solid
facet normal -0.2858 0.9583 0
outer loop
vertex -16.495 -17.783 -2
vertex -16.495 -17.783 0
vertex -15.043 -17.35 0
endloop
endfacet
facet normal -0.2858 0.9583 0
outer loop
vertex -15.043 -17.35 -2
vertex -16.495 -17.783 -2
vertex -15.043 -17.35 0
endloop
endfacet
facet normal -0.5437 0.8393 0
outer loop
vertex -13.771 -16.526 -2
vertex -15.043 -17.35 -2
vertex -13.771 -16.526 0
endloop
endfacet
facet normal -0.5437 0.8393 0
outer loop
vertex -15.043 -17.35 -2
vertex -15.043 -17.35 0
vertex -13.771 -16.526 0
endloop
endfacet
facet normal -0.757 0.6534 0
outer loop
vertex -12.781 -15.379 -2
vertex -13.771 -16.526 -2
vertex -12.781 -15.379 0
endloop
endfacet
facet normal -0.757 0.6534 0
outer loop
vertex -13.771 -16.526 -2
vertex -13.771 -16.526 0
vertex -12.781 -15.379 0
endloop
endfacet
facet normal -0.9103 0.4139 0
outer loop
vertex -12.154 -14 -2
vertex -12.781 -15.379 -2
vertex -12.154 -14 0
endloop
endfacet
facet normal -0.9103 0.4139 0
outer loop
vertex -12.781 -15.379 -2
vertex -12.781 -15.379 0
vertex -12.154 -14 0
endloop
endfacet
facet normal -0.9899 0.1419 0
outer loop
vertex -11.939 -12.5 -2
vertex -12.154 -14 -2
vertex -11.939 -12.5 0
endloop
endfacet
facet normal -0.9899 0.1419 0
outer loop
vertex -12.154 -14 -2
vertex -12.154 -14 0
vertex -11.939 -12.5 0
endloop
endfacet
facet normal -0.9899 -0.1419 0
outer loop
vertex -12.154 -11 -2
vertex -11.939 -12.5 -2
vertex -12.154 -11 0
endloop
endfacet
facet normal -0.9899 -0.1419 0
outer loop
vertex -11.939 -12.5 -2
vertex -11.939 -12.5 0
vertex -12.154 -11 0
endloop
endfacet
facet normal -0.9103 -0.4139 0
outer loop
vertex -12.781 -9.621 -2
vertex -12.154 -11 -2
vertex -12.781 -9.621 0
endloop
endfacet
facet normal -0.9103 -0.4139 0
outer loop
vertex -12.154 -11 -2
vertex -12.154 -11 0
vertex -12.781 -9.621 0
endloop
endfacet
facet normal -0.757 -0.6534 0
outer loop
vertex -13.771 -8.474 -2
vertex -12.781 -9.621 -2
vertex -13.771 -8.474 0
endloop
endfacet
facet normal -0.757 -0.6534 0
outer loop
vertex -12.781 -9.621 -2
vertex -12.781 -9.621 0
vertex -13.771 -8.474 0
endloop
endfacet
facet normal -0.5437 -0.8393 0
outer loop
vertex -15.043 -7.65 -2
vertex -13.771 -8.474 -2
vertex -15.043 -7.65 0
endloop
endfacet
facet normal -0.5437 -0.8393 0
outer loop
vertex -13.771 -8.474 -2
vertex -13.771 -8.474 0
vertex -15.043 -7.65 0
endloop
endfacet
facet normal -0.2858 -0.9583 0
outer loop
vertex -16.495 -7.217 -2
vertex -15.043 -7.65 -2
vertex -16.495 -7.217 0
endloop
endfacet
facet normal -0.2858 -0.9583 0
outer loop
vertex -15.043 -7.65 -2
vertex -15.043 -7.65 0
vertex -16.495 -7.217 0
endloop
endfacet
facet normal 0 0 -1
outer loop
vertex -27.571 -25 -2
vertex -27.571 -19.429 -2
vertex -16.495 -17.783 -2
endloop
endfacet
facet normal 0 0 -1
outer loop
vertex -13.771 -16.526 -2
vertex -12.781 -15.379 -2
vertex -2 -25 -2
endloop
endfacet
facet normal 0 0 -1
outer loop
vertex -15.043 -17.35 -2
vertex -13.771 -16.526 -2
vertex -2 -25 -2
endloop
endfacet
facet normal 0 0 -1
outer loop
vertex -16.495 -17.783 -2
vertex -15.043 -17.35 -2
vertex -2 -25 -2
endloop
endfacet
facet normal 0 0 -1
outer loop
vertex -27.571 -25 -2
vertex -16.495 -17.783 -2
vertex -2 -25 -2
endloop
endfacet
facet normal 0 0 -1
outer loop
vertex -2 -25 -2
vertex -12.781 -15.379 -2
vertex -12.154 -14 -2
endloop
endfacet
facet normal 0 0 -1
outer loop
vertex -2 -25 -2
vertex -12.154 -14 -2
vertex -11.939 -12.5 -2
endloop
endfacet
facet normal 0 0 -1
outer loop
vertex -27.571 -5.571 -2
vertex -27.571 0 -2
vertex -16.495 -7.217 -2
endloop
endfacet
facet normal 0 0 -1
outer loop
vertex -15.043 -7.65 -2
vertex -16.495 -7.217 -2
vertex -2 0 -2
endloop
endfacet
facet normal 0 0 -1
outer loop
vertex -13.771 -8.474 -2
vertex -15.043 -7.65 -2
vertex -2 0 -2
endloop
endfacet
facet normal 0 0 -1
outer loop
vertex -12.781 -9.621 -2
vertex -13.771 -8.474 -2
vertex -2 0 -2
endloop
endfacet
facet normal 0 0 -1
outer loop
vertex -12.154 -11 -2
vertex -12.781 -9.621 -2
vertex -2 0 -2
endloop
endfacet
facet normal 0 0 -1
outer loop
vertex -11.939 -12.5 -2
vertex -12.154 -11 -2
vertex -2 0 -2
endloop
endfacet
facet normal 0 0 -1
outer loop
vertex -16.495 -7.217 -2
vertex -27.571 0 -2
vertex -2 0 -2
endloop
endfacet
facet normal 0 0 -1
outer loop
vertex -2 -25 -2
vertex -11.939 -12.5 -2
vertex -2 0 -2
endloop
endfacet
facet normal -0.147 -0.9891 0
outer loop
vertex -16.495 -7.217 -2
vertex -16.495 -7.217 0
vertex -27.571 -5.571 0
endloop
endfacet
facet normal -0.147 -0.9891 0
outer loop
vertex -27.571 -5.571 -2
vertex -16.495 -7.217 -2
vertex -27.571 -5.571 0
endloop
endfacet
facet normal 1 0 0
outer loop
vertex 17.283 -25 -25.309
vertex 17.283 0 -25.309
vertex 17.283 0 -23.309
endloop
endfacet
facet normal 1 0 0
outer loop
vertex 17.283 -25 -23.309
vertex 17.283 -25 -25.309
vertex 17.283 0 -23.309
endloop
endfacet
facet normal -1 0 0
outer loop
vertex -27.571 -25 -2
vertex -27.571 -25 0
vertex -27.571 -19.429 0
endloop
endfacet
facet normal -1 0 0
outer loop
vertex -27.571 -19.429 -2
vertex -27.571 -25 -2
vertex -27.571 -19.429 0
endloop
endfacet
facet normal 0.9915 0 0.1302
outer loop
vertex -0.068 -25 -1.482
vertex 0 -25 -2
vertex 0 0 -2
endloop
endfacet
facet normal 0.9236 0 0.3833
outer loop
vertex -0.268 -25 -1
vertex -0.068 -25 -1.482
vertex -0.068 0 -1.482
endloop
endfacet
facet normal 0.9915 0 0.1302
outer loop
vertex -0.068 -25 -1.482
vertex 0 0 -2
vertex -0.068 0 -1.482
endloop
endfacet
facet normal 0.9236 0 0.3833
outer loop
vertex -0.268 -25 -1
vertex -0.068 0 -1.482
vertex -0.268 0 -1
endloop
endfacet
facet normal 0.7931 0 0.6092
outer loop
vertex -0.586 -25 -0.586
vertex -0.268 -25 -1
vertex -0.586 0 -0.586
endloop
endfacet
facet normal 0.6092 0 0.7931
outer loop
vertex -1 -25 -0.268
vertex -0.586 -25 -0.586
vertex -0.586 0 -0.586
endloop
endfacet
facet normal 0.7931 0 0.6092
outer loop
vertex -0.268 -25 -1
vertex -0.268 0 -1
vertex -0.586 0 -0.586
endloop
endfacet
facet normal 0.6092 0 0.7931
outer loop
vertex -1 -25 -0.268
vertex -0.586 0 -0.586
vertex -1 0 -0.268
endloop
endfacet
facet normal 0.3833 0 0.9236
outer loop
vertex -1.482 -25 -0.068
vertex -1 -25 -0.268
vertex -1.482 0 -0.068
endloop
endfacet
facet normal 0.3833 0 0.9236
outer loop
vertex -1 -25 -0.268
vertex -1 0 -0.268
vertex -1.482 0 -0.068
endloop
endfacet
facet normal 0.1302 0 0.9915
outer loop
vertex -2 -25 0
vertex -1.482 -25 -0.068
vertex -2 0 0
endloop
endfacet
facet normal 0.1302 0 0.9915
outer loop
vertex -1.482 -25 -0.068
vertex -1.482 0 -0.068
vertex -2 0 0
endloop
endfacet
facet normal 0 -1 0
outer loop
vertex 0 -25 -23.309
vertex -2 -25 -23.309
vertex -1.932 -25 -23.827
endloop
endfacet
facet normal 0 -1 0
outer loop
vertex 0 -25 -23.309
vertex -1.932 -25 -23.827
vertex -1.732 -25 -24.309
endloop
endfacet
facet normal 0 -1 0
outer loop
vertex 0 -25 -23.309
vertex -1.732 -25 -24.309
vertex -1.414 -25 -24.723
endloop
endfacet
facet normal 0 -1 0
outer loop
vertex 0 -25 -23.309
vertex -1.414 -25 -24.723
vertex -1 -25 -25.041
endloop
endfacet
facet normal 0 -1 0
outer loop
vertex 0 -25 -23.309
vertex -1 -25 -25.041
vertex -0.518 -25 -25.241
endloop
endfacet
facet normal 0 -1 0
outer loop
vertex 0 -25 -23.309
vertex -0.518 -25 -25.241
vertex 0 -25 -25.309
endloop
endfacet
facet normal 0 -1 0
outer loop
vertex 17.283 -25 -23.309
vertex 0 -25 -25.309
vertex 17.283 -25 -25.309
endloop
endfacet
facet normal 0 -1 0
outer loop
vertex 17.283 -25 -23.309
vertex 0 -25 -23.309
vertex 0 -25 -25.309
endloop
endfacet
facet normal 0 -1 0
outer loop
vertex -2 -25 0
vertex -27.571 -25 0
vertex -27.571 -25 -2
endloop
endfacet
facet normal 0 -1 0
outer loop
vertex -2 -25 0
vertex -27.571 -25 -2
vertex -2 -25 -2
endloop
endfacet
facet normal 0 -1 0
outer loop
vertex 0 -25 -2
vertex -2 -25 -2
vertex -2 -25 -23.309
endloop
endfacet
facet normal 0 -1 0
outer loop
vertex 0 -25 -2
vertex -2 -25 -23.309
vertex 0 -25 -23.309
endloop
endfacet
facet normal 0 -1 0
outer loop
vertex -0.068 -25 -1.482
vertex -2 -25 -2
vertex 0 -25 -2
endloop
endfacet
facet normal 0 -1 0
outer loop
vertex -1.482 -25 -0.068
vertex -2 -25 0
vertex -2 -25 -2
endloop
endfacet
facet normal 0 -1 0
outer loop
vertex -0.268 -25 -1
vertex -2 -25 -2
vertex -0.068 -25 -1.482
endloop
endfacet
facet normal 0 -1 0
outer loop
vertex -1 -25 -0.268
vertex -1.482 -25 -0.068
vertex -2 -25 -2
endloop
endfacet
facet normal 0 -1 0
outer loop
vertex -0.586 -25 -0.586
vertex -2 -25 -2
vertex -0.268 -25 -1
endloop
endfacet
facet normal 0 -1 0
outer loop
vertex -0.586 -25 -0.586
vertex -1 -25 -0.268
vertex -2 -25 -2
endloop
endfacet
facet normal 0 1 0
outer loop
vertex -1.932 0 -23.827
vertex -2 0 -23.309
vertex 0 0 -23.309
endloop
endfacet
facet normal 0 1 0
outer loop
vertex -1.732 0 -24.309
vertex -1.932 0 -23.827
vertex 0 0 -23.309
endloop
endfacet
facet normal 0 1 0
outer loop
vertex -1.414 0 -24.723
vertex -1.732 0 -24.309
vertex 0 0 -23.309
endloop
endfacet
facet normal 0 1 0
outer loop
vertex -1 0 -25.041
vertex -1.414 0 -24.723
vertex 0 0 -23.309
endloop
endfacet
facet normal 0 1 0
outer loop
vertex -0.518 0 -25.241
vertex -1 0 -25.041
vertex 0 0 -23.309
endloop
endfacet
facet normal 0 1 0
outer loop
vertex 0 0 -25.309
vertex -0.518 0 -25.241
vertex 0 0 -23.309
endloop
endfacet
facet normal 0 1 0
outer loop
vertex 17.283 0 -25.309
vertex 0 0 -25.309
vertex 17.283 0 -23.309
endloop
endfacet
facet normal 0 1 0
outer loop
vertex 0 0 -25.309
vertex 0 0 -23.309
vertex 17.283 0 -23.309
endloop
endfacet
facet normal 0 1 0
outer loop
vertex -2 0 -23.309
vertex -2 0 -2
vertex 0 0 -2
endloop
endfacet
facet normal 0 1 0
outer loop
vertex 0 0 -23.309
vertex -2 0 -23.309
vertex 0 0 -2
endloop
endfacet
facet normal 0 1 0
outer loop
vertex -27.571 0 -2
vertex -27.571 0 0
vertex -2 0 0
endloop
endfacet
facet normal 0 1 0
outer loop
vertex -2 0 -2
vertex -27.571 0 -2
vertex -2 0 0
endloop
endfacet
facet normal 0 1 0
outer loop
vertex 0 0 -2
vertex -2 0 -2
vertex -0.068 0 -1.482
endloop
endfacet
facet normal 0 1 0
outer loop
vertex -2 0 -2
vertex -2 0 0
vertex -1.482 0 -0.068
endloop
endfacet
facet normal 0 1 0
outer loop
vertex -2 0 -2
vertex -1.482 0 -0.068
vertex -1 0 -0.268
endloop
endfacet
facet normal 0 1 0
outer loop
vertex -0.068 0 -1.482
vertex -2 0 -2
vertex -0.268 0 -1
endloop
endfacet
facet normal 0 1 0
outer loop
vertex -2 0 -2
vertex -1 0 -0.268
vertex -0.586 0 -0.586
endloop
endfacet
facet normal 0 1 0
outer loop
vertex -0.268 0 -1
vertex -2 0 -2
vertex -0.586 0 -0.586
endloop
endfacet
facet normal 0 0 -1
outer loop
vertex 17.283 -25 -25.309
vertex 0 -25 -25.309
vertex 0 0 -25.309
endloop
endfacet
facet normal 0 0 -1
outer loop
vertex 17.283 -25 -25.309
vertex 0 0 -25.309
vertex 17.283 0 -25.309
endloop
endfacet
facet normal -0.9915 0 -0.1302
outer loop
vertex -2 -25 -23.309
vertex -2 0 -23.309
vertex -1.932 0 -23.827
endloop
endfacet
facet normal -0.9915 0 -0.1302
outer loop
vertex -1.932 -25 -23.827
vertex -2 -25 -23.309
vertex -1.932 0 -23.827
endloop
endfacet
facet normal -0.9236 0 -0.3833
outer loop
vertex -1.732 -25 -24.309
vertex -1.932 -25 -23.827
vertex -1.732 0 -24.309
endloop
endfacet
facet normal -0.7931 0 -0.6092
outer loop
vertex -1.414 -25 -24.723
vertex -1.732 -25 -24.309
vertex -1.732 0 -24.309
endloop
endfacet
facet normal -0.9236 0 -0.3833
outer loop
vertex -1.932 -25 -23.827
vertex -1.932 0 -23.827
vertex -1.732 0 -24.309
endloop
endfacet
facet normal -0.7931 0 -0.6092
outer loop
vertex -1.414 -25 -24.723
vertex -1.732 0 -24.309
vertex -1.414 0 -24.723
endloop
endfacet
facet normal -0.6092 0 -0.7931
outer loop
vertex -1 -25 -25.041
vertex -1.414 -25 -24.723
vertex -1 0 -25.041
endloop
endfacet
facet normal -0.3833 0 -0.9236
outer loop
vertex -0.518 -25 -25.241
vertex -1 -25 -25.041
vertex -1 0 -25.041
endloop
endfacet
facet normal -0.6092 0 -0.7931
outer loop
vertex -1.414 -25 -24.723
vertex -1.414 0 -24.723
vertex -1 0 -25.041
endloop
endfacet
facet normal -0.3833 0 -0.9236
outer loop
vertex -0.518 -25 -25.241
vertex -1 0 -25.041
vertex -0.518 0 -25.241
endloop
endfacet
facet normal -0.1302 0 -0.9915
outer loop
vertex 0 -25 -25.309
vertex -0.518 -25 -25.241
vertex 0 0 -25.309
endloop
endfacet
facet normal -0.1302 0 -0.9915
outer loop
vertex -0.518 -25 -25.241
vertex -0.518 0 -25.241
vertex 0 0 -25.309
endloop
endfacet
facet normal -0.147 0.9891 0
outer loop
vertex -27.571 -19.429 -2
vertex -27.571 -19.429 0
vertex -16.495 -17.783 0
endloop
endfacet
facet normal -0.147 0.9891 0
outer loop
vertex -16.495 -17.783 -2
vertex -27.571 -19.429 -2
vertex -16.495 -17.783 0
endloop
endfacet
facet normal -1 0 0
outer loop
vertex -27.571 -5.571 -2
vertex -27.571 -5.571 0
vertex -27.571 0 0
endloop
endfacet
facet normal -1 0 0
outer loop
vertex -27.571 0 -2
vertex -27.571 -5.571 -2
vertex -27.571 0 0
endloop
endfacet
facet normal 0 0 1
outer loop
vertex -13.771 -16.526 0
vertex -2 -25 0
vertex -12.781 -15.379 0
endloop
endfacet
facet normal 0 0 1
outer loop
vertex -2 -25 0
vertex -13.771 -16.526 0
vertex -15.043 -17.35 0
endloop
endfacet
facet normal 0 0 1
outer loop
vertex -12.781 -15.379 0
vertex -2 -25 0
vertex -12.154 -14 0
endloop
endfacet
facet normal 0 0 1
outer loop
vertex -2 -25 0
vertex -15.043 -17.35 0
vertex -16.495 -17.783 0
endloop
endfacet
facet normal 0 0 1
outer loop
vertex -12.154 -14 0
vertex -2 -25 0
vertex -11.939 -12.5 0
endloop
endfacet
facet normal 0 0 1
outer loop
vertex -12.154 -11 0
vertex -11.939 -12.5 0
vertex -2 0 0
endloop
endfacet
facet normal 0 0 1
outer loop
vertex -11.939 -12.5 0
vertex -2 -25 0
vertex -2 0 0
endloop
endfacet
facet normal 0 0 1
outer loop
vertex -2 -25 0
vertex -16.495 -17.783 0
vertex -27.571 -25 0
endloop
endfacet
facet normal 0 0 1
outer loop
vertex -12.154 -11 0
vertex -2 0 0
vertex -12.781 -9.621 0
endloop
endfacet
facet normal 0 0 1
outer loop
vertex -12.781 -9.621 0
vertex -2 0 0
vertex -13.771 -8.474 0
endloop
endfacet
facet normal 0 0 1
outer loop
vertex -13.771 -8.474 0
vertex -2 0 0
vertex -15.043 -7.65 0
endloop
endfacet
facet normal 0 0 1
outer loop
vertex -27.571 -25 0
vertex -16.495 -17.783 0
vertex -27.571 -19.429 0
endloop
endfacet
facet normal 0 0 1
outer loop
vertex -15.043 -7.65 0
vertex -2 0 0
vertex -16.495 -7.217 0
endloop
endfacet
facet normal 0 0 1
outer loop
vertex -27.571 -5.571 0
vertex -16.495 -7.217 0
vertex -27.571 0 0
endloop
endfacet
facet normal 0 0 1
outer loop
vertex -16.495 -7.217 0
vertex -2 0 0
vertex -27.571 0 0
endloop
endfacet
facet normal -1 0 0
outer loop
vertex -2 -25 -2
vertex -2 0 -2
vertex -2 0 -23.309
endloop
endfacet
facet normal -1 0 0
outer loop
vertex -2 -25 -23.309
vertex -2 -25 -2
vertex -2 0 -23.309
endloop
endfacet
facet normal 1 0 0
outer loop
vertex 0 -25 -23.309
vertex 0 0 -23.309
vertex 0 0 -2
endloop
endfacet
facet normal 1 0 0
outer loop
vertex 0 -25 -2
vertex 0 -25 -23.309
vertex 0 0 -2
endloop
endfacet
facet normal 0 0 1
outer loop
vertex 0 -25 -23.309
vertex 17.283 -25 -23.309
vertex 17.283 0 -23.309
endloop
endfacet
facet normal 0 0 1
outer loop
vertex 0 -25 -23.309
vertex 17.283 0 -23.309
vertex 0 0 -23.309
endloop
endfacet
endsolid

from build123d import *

# Parameters (mm, degrees)
F1_DEPTH = 25
F2_R     = 5.3407247833
F3_DEPTH = 25.3101193046
F5_DEPTH = 106
F6_DEPTH = 25.3101193046


# Not quite as in the source:
# - an extrude ends at something that could not be found from the text; its depth is read off the source's solid


with BuildPart() as f1:
    # F0 (on Front) → F1 (new body)
    with BuildSketch(Plane.XZ):
        with BuildLine():
            Line((-2, 0), (-58.1267029047, 0))
            Line((-58.1267029047, 0), (-58.1267029047, -2))
            Line((-58.1267029047, -2), (-2, -2))
            Line((-2, -2), (-2, -23.3091193046))
            ThreePointArc((-2, -23.3091193046), (-1.4142135624, -24.723332867), (0, -25.3091193046))
            Line((0, -25.3091193046), (17.2828252222, -25.3091193046))
            Line((17.2828252222, -25.3091193046), (17.2828252222, -23.3091193046))
            Line((17.2828252222, -23.3091193046), (0, -23.3091193046))
            Line((0, -23.3091193046), (0, -2))
            ThreePointArc((0, -2), (-0.5857864376, -0.5857864376), (-2, 0))
        make_face()
    extrude(amount=F1_DEPTH)

    # F2 (on face) → F3 (cut, through all)
    with BuildSketch(Plane.XY):
        with Locations((-17.279623447, -12.5)):
            Circle(F2_R)
    extrude(amount=-F3_DEPTH, mode=Mode.SUBTRACT)

    # F4 (on face) → F5 (cut, through all)
    with BuildSketch(Plane.XY):
        with BuildLine():
            Line((-27.5714416057, -5.5710808575), (-27.5714416057, 0))
            Line((-27.5714416057, 0), (-58.1267029047, 0))
            Line((-58.1267029047, 0), (-58.1267029047, -25))
            Line((-58.1267029047, -25), (-27.5714416057, -25))
            Line((-27.5714416057, -25), (-27.5714416057, -19.4289191425))
            Line((-27.5714416057, -19.4289191425), (-16.4945252417, -17.7827040443))
            ThreePointArc((-16.4945252417, -17.7827040443), (-22.6203482303, -12.5), (-16.4945252417, -7.2172959557))
            Line((-16.4945252417, -7.2172959557), (-27.5714416057, -5.5710808575))
        make_face()
    extrude(amount=F5_DEPTH, mode=Mode.SUBTRACT)

    # F4 (on face) → F6 (cut, through all)
    with BuildSketch(Plane.XY):
        with BuildLine():
            Line((-27.5714416057, -5.5710808575), (-27.5714416057, 0))
            Line((-27.5714416057, 0), (-58.1267029047, 0))
            Line((-58.1267029047, 0), (-58.1267029047, -25))
            Line((-58.1267029047, -25), (-27.5714416057, -25))
            Line((-27.5714416057, -25), (-27.5714416057, -19.4289191425))
            Line((-27.5714416057, -19.4289191425), (-16.4945252417, -17.7827040443))
            ThreePointArc((-16.4945252417, -17.7827040443), (-22.6203482303, -12.5), (-16.4945252417, -7.2172959557))
            Line((-16.4945252417, -7.2172959557), (-27.5714416057, -5.5710808575))
        make_face()
    extrude(amount=-F6_DEPTH, mode=Mode.SUBTRACT)


solid = f1.part
